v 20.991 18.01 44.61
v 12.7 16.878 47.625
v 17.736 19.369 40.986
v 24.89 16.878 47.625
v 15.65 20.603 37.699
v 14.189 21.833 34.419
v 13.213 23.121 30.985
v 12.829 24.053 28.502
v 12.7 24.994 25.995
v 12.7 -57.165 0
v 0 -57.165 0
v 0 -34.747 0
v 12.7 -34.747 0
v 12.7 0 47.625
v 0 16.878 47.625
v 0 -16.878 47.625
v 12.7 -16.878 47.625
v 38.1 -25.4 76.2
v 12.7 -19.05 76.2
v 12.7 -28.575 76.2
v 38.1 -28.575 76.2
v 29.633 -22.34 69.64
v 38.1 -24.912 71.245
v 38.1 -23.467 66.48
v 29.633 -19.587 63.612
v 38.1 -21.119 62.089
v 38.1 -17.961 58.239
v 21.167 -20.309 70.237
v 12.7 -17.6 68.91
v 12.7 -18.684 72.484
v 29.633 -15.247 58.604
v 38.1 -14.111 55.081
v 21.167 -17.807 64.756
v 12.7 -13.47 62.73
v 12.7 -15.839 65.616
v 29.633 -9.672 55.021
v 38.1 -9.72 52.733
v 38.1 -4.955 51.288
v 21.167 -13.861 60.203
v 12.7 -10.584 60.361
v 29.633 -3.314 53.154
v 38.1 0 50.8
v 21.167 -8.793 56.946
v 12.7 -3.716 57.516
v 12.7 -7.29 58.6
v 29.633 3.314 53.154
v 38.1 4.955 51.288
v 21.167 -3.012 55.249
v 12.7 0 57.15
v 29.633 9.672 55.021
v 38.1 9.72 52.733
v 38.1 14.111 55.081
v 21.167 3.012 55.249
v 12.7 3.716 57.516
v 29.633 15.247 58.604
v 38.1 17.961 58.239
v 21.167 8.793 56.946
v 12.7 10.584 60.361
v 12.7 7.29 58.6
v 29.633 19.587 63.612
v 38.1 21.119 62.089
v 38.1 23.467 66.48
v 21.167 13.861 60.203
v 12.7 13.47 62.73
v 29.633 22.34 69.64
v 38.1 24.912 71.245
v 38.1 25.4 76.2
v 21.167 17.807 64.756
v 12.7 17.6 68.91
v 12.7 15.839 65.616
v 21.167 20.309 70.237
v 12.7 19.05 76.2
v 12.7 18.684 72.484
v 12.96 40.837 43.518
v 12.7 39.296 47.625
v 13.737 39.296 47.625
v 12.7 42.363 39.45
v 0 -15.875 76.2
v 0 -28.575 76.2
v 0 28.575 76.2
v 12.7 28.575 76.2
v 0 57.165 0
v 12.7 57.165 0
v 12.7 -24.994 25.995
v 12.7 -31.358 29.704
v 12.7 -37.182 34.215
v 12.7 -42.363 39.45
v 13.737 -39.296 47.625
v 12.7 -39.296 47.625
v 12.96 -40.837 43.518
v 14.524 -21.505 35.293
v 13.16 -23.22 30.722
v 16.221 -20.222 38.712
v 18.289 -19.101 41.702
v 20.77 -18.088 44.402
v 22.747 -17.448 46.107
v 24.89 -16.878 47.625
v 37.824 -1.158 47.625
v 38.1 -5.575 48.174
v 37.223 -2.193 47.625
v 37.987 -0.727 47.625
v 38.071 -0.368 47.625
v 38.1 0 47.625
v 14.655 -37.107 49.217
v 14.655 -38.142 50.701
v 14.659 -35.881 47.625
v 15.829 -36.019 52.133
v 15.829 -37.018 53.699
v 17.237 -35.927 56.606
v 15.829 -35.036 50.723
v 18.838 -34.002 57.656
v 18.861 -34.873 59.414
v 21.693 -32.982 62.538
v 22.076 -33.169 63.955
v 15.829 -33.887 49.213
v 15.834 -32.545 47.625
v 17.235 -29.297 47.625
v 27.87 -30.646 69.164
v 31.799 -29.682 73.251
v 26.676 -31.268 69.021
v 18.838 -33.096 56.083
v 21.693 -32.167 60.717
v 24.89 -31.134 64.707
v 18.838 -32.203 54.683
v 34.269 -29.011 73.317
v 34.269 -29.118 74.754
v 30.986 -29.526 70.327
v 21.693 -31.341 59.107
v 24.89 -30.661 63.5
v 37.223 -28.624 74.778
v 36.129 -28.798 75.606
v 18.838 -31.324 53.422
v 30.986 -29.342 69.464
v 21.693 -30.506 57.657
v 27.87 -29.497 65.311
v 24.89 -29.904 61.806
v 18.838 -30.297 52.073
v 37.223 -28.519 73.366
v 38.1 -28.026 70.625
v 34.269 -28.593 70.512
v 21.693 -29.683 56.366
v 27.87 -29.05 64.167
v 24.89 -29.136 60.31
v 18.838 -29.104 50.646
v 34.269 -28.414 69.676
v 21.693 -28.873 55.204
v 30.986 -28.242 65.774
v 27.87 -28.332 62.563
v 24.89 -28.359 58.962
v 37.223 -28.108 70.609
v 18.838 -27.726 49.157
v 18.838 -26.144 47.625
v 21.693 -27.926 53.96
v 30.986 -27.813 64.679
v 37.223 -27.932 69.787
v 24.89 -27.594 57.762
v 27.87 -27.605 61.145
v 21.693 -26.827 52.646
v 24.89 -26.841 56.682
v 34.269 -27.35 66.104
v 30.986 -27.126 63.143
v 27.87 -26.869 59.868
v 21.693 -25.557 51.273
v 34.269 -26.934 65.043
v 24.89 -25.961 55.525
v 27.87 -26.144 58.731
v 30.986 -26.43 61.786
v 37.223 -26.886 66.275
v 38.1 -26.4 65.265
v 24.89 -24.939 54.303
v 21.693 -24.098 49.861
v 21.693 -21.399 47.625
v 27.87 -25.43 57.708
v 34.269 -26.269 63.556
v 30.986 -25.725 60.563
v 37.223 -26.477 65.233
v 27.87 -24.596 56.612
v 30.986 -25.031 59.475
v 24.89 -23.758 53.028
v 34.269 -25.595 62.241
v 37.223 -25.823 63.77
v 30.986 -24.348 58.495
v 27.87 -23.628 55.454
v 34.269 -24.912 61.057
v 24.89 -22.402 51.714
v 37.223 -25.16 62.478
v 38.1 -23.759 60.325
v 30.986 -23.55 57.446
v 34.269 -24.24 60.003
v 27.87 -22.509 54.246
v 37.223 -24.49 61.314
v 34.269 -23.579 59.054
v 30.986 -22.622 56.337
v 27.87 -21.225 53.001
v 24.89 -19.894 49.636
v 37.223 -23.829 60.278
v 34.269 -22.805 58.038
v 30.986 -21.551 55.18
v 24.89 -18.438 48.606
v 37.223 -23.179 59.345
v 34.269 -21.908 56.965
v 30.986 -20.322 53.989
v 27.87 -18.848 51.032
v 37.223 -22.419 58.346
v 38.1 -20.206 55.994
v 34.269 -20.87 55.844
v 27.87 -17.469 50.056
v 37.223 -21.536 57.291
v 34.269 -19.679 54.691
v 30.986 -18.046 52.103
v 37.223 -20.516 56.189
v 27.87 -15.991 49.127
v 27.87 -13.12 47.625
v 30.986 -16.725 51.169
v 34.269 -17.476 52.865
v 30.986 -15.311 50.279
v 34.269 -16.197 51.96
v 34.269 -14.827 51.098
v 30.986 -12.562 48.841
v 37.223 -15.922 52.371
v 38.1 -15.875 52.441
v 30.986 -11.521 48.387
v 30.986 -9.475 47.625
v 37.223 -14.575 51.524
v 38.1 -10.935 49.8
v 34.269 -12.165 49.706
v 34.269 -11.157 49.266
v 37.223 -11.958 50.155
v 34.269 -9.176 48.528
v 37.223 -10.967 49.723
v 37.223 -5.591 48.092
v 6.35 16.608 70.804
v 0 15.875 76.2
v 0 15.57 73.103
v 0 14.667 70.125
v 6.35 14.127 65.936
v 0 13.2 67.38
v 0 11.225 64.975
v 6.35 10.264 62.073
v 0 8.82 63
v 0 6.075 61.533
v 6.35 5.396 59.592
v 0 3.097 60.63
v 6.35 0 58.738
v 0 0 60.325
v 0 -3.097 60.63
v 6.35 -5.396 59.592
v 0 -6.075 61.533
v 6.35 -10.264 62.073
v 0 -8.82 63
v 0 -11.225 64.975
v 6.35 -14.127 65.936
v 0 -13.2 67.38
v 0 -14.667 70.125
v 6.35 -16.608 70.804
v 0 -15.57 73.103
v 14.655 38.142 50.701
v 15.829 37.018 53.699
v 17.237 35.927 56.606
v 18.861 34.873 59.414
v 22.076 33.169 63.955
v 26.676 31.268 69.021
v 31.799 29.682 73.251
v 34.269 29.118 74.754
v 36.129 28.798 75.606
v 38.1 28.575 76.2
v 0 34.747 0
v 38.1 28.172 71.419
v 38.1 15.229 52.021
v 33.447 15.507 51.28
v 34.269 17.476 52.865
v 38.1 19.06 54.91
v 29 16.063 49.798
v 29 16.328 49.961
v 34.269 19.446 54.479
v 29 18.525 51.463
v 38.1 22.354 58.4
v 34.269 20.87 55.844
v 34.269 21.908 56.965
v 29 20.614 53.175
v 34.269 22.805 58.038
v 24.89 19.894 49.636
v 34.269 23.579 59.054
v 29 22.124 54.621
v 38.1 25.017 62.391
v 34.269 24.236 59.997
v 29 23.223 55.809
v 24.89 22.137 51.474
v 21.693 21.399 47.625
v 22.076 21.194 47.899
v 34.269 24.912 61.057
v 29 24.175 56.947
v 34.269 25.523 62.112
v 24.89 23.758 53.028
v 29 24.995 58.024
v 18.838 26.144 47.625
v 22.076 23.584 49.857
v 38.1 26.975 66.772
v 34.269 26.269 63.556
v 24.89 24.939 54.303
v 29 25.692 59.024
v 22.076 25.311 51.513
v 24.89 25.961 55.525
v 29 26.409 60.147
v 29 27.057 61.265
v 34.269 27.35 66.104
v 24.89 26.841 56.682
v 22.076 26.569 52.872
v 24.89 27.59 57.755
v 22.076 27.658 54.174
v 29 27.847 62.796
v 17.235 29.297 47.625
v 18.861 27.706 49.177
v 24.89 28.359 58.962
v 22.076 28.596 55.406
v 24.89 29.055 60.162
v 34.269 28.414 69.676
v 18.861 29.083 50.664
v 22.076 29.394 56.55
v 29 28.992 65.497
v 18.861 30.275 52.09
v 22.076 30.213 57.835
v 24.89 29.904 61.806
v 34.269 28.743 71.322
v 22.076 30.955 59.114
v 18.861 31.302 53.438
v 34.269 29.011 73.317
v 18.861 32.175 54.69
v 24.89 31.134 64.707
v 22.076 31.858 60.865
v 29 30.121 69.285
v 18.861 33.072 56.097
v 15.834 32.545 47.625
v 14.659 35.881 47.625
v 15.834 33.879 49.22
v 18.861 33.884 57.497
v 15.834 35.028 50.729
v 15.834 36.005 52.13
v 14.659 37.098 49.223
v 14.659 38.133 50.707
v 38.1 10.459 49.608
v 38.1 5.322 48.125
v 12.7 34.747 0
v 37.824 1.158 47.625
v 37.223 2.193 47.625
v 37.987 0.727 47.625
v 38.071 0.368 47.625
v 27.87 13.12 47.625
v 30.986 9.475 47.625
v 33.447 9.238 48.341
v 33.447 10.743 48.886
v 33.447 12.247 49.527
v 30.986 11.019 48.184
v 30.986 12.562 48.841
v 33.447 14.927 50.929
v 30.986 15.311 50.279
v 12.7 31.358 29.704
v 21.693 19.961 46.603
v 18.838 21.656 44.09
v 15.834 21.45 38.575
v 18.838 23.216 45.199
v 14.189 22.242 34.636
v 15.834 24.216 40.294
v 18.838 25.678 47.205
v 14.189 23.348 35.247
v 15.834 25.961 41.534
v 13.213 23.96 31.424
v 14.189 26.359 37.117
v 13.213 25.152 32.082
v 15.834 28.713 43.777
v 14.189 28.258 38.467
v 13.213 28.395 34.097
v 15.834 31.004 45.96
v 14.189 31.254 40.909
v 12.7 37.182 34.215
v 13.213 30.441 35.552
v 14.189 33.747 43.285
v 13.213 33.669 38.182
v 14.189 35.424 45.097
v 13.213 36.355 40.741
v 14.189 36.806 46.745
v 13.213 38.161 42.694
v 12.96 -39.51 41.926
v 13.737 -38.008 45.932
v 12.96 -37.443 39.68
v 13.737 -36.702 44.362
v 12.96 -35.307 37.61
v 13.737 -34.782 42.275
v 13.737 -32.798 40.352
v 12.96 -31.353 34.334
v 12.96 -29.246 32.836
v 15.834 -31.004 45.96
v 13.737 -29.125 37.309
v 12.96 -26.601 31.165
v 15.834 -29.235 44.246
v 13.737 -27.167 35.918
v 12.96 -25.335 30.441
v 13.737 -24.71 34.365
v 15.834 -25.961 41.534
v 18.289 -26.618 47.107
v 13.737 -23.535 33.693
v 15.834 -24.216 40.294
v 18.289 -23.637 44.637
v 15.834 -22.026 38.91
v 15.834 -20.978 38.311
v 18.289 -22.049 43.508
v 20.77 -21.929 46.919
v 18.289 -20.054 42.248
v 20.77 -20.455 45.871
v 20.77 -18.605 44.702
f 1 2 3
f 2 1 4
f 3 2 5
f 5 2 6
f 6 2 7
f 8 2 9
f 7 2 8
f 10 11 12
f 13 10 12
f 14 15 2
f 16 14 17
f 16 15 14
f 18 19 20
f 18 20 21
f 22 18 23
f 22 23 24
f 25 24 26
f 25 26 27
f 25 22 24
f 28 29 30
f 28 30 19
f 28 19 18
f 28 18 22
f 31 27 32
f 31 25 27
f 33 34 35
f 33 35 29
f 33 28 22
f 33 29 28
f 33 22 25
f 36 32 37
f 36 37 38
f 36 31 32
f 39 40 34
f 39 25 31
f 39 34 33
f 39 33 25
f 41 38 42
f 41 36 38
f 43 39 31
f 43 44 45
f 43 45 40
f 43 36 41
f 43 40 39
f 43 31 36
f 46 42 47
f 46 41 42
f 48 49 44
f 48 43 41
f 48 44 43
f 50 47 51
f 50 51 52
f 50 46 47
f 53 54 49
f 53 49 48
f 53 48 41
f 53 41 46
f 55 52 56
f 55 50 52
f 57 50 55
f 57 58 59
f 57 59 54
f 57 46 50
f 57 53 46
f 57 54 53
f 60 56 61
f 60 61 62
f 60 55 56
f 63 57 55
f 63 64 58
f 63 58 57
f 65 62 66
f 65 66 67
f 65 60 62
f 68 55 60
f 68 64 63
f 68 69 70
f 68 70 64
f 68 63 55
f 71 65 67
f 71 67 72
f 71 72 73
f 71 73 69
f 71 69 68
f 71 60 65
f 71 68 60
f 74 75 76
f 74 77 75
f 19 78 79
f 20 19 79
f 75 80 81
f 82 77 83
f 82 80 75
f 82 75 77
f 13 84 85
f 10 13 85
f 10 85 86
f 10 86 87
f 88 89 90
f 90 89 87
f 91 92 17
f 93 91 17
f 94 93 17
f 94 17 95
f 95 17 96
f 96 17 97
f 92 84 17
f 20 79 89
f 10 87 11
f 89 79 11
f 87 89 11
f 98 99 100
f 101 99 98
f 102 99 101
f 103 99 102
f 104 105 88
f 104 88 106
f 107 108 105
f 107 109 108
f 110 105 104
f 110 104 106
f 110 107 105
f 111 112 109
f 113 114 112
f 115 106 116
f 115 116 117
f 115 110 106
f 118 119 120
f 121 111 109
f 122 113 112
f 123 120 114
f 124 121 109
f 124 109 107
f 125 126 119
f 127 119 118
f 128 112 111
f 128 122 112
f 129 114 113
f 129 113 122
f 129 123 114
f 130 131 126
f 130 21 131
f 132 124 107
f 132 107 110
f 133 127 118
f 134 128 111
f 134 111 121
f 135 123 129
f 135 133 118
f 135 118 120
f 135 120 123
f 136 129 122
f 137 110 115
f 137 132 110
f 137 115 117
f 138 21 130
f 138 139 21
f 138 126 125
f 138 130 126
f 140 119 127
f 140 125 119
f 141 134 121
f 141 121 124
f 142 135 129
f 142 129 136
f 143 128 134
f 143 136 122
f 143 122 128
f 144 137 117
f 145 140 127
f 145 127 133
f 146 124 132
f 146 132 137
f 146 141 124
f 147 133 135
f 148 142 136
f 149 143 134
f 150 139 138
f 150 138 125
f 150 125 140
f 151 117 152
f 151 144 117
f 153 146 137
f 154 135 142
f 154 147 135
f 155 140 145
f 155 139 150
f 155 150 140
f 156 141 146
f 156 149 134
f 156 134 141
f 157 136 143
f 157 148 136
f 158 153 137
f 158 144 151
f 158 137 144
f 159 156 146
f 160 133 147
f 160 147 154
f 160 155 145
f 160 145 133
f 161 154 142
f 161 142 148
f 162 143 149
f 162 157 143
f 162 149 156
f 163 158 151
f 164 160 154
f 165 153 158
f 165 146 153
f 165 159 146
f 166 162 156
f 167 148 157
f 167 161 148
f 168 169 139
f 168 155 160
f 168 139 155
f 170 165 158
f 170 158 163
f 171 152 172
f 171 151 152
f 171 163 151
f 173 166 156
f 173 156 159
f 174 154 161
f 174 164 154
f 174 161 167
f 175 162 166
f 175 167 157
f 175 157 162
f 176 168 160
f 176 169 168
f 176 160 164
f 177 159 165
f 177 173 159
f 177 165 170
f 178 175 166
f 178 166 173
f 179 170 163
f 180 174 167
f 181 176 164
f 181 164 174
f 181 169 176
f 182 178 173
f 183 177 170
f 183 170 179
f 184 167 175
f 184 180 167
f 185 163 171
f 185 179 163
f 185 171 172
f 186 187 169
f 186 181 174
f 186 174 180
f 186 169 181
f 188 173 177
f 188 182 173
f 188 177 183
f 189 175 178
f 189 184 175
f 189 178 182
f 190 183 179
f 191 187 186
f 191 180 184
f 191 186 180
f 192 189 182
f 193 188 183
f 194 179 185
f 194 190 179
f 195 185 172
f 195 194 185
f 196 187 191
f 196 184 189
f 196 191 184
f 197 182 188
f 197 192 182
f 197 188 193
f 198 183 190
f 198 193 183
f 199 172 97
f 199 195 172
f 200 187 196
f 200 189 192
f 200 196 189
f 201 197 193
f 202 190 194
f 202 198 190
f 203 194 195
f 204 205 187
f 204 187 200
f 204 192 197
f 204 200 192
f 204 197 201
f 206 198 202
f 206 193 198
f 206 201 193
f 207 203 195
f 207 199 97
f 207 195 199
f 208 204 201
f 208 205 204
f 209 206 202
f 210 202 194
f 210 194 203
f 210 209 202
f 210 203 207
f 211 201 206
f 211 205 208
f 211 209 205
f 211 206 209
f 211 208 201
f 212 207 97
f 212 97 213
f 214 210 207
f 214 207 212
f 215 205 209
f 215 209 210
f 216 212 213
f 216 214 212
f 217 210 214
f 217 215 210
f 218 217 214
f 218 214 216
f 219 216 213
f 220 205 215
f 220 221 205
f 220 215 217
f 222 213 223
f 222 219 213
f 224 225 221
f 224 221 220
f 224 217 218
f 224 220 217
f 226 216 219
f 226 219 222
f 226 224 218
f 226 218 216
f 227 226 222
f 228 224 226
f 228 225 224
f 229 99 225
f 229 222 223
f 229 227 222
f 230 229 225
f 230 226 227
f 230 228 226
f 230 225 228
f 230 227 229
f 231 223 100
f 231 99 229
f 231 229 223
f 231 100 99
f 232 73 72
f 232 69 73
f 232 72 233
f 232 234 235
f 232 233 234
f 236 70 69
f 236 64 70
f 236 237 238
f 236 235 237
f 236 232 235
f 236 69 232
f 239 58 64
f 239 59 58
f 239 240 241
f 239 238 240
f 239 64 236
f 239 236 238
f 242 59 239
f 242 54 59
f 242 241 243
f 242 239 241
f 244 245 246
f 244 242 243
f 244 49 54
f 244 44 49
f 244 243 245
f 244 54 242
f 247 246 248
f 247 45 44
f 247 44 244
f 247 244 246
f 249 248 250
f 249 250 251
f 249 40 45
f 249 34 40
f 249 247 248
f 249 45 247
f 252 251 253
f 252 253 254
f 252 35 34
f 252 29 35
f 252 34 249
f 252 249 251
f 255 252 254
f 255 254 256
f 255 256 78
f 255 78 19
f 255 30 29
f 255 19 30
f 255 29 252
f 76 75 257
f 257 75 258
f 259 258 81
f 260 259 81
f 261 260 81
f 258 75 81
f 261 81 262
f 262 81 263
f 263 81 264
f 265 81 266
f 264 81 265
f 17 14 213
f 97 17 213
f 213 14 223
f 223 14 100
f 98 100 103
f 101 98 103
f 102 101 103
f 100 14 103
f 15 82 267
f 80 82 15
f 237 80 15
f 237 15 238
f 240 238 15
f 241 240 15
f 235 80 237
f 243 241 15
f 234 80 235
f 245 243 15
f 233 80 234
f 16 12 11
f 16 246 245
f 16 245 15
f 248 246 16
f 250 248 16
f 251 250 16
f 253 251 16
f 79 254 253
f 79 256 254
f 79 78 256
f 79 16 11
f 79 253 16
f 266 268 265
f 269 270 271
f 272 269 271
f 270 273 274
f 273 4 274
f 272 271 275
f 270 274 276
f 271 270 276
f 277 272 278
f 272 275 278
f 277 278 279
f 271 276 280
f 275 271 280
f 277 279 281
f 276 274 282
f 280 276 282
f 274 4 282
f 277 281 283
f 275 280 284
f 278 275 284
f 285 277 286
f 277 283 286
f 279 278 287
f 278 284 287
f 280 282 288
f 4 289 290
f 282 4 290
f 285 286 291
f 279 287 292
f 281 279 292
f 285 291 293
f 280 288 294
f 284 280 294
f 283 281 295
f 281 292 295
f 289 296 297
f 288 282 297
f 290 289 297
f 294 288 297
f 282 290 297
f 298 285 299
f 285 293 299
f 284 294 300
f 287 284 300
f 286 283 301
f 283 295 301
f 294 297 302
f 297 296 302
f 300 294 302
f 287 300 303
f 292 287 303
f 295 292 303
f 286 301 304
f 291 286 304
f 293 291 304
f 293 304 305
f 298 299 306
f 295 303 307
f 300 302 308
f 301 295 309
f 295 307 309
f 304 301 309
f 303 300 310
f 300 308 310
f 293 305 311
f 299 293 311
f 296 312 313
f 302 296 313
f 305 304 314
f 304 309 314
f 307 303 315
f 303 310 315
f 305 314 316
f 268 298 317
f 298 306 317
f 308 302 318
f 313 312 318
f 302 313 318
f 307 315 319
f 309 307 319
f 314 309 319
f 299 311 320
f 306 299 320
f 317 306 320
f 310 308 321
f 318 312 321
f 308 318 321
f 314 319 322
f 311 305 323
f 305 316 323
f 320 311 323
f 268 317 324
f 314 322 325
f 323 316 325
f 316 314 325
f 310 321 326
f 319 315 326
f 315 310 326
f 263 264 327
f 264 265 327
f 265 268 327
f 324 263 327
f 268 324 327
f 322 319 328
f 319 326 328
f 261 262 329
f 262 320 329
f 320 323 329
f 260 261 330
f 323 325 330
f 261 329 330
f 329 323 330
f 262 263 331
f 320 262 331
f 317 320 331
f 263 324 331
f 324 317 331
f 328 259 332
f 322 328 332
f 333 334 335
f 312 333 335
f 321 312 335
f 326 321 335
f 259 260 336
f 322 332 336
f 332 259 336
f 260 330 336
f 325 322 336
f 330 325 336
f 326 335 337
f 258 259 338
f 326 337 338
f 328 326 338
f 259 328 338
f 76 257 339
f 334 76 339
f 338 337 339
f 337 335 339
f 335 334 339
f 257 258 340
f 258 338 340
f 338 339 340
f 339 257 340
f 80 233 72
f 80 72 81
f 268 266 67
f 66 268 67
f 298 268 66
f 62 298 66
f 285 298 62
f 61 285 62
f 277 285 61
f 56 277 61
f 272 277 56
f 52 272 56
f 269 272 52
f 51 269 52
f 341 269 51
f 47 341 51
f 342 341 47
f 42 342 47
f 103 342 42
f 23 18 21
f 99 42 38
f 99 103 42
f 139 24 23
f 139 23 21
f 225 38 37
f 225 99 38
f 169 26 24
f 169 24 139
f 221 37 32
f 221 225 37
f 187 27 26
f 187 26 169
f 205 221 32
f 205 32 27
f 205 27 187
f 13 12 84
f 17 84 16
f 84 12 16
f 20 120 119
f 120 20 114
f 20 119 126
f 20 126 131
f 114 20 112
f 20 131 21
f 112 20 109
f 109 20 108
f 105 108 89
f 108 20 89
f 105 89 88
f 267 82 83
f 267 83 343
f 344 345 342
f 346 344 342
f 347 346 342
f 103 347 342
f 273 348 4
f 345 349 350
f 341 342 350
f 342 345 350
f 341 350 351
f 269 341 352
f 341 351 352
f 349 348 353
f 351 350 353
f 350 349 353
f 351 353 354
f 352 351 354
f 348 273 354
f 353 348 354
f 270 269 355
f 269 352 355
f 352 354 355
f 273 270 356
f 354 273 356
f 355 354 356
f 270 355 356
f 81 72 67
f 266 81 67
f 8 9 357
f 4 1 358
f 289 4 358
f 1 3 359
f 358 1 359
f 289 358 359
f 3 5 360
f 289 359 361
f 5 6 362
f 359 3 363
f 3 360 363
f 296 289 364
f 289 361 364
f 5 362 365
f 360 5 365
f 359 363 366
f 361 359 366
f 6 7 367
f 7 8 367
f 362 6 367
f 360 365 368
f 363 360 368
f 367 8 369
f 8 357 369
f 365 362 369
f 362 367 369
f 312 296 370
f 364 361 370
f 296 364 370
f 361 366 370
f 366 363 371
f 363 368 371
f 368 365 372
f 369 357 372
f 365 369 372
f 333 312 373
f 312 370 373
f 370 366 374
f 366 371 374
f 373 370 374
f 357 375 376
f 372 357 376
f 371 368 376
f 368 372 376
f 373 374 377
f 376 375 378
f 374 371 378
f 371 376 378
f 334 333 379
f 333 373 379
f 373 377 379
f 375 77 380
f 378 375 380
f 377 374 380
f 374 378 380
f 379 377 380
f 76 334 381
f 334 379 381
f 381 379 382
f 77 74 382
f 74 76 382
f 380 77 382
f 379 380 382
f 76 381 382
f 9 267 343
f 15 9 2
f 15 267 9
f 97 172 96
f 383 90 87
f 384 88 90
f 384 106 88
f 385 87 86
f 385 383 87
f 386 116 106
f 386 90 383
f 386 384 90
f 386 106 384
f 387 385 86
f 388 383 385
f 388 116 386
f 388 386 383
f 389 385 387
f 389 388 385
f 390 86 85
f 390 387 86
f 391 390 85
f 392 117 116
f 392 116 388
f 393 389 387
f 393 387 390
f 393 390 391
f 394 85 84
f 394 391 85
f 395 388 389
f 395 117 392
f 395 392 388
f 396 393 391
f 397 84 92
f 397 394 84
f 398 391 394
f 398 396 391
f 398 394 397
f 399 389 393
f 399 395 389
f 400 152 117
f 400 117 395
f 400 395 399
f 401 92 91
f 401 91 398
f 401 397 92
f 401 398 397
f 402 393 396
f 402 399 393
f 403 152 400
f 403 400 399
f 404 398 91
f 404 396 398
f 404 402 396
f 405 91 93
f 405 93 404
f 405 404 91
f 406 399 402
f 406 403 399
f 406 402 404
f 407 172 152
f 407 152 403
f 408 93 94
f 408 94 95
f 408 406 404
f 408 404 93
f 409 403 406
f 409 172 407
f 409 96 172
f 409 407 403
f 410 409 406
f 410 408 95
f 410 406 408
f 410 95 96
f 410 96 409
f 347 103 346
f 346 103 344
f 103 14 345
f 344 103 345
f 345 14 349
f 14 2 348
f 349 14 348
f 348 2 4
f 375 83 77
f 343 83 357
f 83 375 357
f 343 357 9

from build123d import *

# Parameters (mm, degrees)
F1_DEPTH     = 12.7
F6_ANGLE     = 180
F7_T4_ANGLE  = 90.0000003922
F7_T10_ANGLE = 227.9415431295
F7_T17_ANGLE = 89.9999996078
F7_T23_ANGLE = 89.9999996078


# Not quite as in the source:
# - a fillet or chamfer that OpenCascade refuses, or shapes differently, is made with other operations: its cross-section is extruded or revolved along the edge and cut away or added


with BuildPart() as f1:
    # F0 (on Right) → F1 (new body)
    with BuildSketch(Plane.YZ):
        with BuildLine():
            Line((-57.16524, 0), (-34.7472, 0))
            Line((-34.7472, 0), (-16.8783, 47.625))
            Line((-16.8783, 47.625), (0, 47.625))
            Line((0, 47.625), (0, 60.325))
            ThreePointArc((0, 60.325), (-11.2253201513, 64.9746798487), (-15.875, 76.2))
            Line((-15.875, 76.2), (-28.575, 76.2))
            Line((-28.575, 76.2), (-57.16524, 0))
        make_face()
    extrude(amount=F1_DEPTH)

    # F2: F1 across plane


with BuildPart() as f1_1:
    add(f1.part)
    add(f1.part.mirror(Plane.XZ))

    # F3 (on face) → F4 (revolve, cut)
    with BuildSketch(Plane.XY.offset(76.2)):
        Polygon((12.7, -15.875), (0, -15.875), (12.7, -19.05), align=None)
    revolve(axis=Axis((5.5597093888, 0, 76.2), (-1, 0, 0)), mode=Mode.SUBTRACT)

    # F5 (on face) → F6 (revolve)
    with BuildSketch(Plane.XY.offset(76.2)):
        Polygon((38.1, -25.4), (12.7, -19.05), (12.7, -28.575), (38.1, -28.575), align=None)
    revolve(axis=Axis((19.4450803101, 0, 76.2), (1, 0, 0)), revolution_arc=F6_ANGLE)

    # F7: fillet of radius 27.5944610179 on 1 edges, made by hand


with BuildPart() as f7_tool2:
    # F7_s3 → F7_t4 (revolve)
    with BuildSketch(Plane.XY.offset(76.2)):
        with BuildLine():
            ThreePointArc((12.7, -56.0820649054), (20.0212120444, -37.3617642954), (38.1, -28.575))
            Line((38.1, -28.575), (12.7, -28.575))
            Line((12.7, -28.575), (12.7, -56.0820649054))
        make_face()
    revolve(axis=Axis((12.7, 0, 76.2), (1, 0, 0)), revolution_arc=F7_T4_ANGLE)

    split(bisect_by=Plane(origin=(0, -50.1108790038, 18.8016018022), x_dir=(1, 0, 0), z_dir=(0, 0.9362676004, -0.3512876037)), keep=Keep.TOP)

    split(bisect_by=Plane.XY.offset(47.625), keep=Keep.TOP)


with BuildPart() as f1_2:
    add(f1_1.part)

    # F7_t1: union F7_tool2
    add(f7_tool2.part)


with BuildPart() as f7_tool8:
    # F7_s9 → F7_t10 (revolve)
    with BuildSketch(Plane(origin=(0, -37.8993318562, 42.0052074025), x_dir=(1, 0, 0), z_dir=(0, 0.6698884676, -0.7424617438))):
        with BuildLine():
            ThreePointArc((12.7, -107.1275661365), (20.0212120444, -88.4072655265), (38.1, -79.6205012311))
            Line((38.1, -79.6205012311), (12.7, -79.6205012311))
            Line((12.7, -79.6205012311), (12.7, -107.1275661365))
        make_face()
    revolve(axis=Axis((12.7, 0, 76.2), (1, 0, 0)), revolution_arc=F7_T10_ANGLE)

    split(bisect_by=Plane(origin=(0, -50.1108790038, 18.8016018022), x_dir=(1, 0, 0), z_dir=(0, 0.9362676004, -0.3512876037)), keep=Keep.TOP)

    split(bisect_by=Plane(origin=(0, -30.4592919565, 11.4283263421), x_dir=(1, 0, 0), z_dir=(0, -0.9362676004, 0.3512876037)), keep=Keep.TOP)

    split(bisect_by=Plane.XY.offset(47.625), keep=Keep.BOTTOM)


with BuildPart() as f1_3:
    add(f1_2.part)

    # F7_t7: union F7_tool8
    add(f7_tool8.part)


with BuildPart() as f7_tool15:
    # F7_s16 → F7_t17 (revolve)
    with BuildSketch(Plane.XZ):
        with BuildLine():
            ThreePointArc((38.1, 47.625), (20.0212120444, 38.8382357046), (12.7, 20.1179350946))
            Line((12.7, 20.1179350946), (12.7, 47.625))
            Line((12.7, 47.625), (38.1, 47.625))
        make_face()
    revolve(axis=Axis((12.7, 0, 76.2), (1, 0, 0)), revolution_arc=F7_T17_ANGLE)

    split(bisect_by=Plane.XY.offset(47.625), keep=Keep.TOP)

    split(bisect_by=Plane(origin=(0, 50.1108790038, 18.8016018022), x_dir=(1, 0, 0), z_dir=(0, -0.9362676004, -0.3512876037)), keep=Keep.TOP)


with BuildPart() as f1_4:
    add(f1_3.part)

    # F7_t14: union F7_tool15
    add(f7_tool15.part)


with BuildPart() as f7_tool21:
    # F7_s22 → F7_t23 (revolve)
    with BuildSketch(Plane.XZ):
        with BuildLine():
            ThreePointArc((38.1, 47.625), (20.0212120444, 38.8382357046), (12.7, 20.1179350946))
            Line((12.7, 20.1179350946), (12.7, 47.625))
            Line((12.7, 47.625), (38.1, 47.625))
        make_face()
    revolve(axis=Axis((12.7, 0, 76.2), (1, 0, 0)), revolution_arc=F7_T23_ANGLE)

    split(bisect_by=Plane(origin=(0, 30.4592919565, 11.4283263421), x_dir=(1, 0, 0), z_dir=(0, 0.9362676004, 0.3512876037)), keep=Keep.TOP)

    split(bisect_by=Plane(origin=(0, 50.1108790038, 18.8016018022), x_dir=(1, 0, 0), z_dir=(0, -0.9362676004, -0.3512876037)), keep=Keep.TOP)


with BuildPart() as f1_5:
    add(f1_4.part)

    # F7_t20: union F7_tool21
    add(f7_tool21.part)


solid = f1_5.part
